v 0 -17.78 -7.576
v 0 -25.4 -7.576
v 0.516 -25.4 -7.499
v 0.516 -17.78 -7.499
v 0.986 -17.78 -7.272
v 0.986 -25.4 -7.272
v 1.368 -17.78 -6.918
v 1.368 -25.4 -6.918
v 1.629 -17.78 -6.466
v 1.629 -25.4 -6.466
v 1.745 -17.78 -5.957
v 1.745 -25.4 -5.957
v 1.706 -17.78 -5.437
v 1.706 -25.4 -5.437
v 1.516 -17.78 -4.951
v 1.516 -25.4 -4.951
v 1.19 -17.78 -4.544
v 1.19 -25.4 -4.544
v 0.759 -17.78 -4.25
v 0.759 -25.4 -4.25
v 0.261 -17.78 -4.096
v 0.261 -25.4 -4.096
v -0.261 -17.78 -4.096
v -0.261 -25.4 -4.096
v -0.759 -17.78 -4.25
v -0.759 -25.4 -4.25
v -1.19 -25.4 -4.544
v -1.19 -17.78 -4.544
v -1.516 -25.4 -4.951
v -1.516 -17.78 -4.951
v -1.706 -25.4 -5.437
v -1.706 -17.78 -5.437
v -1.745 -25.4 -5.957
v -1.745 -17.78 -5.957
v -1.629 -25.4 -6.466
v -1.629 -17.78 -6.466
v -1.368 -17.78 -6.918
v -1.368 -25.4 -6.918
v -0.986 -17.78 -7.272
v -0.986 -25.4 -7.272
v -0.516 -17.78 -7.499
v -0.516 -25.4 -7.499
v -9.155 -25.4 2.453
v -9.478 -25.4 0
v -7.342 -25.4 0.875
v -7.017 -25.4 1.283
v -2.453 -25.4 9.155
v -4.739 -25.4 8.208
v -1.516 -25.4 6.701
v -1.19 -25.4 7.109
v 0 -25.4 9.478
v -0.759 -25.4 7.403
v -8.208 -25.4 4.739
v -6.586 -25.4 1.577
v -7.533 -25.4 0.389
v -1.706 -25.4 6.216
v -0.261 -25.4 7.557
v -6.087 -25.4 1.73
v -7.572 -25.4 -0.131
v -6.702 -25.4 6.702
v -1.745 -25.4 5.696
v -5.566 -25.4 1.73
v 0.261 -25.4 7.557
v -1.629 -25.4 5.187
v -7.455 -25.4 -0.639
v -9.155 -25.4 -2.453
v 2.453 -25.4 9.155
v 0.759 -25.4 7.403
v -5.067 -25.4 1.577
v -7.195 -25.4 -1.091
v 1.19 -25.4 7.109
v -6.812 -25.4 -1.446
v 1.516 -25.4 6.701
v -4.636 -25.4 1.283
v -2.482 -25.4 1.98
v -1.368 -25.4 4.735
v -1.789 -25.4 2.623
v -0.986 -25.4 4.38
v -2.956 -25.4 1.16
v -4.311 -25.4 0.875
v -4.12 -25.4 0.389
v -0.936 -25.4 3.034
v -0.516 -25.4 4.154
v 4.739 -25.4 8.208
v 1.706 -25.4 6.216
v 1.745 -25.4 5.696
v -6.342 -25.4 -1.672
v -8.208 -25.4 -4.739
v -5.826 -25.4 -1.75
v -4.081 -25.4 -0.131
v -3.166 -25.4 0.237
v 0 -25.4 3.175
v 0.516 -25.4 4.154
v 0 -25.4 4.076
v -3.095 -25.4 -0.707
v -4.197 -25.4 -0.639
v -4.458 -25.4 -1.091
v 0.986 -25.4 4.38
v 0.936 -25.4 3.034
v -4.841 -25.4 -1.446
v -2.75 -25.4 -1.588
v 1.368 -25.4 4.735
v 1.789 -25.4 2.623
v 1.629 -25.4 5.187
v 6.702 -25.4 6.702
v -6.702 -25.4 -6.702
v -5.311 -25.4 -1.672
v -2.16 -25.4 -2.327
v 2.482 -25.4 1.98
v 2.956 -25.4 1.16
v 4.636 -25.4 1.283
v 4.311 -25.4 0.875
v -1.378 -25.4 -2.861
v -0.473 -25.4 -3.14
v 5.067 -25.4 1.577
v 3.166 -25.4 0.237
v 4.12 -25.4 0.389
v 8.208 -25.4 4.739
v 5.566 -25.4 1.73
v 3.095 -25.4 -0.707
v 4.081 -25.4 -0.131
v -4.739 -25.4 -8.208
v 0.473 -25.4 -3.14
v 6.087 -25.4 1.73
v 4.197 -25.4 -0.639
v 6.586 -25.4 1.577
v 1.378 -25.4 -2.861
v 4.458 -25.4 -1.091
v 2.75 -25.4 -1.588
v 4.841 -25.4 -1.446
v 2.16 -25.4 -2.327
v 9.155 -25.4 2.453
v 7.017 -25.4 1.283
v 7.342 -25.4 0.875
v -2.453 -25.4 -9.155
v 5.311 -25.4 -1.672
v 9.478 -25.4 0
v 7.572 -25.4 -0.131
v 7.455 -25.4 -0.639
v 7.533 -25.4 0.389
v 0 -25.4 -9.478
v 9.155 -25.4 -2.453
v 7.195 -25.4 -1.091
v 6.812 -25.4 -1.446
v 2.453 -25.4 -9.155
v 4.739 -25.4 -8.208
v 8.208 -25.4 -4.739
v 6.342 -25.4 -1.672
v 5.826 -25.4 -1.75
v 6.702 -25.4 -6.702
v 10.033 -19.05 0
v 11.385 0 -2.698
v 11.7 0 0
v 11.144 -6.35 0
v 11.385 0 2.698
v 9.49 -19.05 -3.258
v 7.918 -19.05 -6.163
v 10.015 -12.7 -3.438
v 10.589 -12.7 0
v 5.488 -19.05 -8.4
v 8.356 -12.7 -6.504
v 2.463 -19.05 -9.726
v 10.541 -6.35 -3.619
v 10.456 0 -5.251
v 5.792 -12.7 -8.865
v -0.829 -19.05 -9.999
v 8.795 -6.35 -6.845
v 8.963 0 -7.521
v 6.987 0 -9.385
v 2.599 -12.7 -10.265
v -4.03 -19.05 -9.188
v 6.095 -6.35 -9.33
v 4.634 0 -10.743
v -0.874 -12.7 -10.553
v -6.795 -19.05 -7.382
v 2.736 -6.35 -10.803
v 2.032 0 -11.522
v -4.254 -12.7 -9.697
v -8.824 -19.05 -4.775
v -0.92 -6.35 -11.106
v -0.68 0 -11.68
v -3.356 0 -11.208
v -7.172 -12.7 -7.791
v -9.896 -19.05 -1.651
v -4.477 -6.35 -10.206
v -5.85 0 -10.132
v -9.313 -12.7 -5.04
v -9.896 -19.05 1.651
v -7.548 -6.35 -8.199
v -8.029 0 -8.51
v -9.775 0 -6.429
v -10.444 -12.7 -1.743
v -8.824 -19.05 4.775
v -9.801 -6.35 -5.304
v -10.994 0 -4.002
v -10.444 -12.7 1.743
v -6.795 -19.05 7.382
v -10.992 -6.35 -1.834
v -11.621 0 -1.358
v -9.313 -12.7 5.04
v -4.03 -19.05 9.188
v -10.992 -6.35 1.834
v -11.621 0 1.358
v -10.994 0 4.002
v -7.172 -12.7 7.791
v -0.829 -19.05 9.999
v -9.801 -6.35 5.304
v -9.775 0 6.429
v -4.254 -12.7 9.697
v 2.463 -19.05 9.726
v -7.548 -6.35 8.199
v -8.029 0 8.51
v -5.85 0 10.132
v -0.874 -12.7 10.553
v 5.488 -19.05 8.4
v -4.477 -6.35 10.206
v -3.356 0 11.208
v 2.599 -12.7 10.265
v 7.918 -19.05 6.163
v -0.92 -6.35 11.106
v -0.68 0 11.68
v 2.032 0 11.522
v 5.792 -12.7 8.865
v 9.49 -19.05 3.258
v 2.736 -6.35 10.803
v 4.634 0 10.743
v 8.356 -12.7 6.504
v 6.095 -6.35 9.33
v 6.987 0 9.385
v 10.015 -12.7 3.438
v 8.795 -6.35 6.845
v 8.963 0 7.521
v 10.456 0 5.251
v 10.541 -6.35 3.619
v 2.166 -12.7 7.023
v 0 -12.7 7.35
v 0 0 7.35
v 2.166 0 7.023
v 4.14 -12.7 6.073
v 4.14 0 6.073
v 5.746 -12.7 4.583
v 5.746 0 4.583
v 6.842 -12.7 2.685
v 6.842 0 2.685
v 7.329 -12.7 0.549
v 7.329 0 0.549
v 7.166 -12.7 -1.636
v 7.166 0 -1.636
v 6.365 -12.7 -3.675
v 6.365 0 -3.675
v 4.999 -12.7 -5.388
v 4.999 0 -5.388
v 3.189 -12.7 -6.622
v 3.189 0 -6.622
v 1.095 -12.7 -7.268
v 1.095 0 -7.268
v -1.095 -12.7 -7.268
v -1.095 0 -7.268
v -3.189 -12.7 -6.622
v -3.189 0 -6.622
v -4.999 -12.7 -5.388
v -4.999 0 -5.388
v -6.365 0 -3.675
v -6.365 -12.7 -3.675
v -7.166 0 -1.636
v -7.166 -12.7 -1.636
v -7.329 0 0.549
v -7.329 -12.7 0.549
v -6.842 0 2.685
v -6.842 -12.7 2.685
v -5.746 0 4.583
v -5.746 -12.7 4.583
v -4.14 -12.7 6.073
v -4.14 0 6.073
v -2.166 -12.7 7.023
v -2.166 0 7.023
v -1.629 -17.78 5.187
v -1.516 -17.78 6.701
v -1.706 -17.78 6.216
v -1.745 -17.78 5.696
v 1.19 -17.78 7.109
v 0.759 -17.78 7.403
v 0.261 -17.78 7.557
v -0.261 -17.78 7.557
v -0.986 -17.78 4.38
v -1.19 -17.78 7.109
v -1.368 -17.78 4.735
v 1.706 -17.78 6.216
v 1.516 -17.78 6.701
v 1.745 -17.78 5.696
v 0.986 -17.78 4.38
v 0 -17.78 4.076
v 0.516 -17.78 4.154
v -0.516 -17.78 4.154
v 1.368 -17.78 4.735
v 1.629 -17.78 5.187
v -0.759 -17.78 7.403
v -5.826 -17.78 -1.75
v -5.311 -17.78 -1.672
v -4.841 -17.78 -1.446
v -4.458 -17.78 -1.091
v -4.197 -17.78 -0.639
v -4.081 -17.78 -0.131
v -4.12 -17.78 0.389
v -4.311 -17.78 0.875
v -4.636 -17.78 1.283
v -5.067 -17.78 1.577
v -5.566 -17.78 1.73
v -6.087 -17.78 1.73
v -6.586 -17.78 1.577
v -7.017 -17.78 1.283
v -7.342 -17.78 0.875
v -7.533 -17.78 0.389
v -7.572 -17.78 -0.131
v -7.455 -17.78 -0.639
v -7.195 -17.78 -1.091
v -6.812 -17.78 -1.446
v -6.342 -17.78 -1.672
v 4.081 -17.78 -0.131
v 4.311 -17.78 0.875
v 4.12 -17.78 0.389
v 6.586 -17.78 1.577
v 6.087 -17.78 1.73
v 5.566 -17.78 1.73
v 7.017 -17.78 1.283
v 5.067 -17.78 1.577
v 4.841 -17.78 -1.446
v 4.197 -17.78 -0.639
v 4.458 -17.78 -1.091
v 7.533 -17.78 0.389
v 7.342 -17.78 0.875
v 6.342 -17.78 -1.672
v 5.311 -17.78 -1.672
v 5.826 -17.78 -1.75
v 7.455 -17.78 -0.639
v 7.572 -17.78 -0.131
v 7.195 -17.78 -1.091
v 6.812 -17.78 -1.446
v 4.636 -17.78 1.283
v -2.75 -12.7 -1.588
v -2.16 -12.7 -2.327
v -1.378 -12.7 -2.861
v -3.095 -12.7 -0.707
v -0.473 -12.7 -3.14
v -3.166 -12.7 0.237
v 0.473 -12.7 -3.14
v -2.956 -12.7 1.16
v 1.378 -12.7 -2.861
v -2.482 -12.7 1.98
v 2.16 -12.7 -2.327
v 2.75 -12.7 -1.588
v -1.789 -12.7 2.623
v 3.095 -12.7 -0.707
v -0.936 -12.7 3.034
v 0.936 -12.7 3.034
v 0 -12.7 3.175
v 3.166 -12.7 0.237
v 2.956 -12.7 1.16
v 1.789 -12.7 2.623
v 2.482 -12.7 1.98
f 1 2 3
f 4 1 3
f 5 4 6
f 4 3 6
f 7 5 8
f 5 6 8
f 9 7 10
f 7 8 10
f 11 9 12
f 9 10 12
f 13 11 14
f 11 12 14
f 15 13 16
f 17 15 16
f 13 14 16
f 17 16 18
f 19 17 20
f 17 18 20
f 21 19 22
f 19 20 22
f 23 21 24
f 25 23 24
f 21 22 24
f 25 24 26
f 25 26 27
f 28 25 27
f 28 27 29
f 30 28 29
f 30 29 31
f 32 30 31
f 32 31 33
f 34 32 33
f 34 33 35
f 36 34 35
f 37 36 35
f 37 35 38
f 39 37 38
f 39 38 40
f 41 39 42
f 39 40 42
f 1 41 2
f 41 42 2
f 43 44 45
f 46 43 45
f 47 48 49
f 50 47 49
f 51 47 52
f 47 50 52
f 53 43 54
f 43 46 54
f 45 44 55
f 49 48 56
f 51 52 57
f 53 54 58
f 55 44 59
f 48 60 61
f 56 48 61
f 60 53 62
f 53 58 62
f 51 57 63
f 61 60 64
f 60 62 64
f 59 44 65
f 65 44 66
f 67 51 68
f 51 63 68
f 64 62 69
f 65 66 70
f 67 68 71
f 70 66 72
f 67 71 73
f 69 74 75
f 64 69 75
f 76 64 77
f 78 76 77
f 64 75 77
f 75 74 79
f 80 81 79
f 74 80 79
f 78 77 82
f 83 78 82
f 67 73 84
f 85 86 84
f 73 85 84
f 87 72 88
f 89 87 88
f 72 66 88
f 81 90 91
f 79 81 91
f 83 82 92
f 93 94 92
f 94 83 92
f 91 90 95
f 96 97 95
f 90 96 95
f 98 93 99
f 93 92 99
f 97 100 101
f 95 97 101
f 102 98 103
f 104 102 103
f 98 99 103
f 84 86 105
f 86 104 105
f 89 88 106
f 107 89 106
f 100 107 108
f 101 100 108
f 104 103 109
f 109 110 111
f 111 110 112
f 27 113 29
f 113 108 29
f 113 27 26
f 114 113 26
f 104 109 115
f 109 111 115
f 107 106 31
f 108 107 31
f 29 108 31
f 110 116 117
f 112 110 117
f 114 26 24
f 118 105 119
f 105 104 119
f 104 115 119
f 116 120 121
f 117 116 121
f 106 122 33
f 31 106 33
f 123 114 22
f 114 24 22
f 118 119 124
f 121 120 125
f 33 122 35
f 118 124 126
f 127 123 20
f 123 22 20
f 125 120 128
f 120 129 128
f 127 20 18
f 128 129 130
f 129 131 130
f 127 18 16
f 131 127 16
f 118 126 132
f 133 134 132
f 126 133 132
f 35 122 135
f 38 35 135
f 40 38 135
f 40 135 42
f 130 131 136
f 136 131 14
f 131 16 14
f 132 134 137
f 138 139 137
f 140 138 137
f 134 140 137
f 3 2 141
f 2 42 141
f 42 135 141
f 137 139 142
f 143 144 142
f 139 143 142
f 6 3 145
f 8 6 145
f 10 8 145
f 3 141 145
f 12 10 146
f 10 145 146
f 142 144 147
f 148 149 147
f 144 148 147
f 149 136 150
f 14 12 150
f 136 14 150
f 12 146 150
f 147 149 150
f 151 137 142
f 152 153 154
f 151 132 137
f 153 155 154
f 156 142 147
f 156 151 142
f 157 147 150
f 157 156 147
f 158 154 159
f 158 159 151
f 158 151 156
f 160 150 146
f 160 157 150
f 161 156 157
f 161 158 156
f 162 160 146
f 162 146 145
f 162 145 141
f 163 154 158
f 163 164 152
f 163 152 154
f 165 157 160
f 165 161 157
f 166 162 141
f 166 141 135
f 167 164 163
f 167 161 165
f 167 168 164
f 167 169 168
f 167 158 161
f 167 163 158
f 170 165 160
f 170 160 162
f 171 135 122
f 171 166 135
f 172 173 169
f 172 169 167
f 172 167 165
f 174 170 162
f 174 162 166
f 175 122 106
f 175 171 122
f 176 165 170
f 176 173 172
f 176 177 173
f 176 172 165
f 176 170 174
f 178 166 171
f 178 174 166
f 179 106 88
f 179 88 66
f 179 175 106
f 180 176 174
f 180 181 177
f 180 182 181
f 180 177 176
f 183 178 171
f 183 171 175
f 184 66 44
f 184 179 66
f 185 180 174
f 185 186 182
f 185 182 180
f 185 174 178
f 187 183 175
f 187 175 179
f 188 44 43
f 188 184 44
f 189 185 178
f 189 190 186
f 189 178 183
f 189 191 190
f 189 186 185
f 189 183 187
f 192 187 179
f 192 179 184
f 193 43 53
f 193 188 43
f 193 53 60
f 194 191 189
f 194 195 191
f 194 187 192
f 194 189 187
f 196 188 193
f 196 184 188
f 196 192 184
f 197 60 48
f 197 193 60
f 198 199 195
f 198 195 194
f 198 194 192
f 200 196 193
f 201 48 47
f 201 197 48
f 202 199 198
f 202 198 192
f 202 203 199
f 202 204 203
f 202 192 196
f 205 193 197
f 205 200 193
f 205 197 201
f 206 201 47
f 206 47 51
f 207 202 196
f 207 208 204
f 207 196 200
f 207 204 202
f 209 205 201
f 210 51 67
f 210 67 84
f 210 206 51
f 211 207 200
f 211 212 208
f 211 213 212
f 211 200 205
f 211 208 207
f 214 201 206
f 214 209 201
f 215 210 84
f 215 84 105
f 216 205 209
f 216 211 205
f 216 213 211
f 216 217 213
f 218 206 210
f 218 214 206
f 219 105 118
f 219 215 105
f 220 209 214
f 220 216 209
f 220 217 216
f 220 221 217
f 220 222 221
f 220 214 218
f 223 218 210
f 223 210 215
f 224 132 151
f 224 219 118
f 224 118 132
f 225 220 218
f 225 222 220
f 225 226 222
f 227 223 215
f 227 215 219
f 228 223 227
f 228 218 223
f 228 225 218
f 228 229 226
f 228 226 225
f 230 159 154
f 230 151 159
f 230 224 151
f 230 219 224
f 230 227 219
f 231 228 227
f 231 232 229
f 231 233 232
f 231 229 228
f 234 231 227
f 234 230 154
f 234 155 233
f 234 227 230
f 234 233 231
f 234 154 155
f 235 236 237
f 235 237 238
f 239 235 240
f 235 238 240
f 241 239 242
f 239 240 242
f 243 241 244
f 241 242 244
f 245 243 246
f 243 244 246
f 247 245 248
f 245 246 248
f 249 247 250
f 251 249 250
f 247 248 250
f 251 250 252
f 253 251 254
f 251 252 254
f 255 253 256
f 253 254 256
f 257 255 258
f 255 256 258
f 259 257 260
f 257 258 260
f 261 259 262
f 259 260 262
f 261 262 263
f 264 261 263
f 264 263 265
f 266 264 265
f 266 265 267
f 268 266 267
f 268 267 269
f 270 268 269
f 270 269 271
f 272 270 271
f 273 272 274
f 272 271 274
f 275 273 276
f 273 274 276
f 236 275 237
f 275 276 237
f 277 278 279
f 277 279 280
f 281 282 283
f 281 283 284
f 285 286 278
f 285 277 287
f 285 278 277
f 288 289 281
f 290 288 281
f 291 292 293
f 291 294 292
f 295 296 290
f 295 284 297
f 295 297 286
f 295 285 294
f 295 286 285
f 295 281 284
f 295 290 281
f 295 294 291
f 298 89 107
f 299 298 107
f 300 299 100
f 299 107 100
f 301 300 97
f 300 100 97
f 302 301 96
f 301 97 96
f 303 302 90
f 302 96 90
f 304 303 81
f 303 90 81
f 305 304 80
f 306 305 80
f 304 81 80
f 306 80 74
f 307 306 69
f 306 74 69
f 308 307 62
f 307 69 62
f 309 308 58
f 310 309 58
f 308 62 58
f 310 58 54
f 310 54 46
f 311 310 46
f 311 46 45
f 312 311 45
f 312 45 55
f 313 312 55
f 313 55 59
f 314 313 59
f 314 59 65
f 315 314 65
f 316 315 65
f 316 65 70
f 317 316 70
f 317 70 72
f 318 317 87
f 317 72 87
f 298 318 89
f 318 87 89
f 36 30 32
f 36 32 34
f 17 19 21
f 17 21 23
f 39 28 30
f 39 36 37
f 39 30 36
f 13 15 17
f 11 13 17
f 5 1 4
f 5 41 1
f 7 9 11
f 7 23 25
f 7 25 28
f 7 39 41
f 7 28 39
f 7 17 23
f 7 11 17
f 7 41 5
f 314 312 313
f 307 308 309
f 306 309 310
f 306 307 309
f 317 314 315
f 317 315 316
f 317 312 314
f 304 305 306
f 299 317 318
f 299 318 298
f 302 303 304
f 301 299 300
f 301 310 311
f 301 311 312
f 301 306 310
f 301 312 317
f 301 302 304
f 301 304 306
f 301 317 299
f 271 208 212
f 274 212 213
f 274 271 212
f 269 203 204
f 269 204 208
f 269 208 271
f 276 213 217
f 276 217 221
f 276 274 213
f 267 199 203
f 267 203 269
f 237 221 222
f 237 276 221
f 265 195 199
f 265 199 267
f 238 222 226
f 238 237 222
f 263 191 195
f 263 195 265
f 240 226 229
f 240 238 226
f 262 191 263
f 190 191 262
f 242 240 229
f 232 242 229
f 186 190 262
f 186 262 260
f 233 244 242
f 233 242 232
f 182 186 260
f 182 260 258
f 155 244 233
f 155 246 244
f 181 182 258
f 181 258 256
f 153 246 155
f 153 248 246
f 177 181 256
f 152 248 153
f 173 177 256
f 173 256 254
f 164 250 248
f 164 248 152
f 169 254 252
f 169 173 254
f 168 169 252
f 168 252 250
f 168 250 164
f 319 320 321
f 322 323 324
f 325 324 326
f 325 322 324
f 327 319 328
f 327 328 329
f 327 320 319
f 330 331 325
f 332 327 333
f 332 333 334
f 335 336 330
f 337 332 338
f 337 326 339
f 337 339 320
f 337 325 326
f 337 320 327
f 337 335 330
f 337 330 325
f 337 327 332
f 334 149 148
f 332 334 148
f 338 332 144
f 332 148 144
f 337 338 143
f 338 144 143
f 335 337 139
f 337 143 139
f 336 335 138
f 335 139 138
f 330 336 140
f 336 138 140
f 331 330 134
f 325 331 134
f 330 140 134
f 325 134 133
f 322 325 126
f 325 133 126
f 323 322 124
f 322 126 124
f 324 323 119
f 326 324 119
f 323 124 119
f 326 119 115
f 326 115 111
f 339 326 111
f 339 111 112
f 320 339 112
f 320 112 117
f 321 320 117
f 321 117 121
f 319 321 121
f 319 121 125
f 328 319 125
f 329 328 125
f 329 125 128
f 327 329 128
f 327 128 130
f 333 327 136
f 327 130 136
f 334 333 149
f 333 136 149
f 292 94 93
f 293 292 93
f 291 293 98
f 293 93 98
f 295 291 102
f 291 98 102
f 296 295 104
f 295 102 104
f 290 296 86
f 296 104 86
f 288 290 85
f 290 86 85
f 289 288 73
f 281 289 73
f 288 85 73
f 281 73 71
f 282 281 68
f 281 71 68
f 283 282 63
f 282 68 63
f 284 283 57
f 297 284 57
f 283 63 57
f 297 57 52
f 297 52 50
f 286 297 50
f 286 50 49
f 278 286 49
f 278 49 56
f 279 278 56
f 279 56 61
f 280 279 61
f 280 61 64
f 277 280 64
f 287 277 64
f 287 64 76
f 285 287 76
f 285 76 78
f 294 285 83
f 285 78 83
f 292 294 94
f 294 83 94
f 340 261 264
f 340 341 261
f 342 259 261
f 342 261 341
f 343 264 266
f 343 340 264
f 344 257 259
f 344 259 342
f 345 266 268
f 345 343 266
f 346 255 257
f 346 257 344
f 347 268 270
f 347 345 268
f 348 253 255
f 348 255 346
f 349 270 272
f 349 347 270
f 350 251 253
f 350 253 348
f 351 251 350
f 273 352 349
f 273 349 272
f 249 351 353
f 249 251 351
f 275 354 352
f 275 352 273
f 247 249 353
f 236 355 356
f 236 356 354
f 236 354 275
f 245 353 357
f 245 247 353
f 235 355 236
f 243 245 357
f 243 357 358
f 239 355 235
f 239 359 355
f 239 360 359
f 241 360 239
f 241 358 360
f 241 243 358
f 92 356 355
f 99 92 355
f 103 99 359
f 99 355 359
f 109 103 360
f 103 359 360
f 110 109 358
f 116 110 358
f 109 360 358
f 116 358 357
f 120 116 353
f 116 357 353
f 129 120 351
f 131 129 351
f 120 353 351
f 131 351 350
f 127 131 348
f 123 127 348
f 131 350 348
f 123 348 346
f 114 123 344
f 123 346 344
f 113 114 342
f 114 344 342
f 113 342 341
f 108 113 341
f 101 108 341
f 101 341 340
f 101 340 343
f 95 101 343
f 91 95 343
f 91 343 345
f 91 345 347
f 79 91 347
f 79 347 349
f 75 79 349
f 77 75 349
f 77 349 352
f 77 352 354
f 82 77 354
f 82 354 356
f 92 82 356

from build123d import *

# Parameters (mm, degrees)
SKETCH1_R           = 11.7
BOSS_EXTRUDE1_DEPTH = 25.4
BOSS_EXTRUDE1_DRAFT = -5
SKETCH2_R           = 3.175
CUT_EXTRUDE1_DEPTH  = 31.314023158
SKETCH9_R           = 7.35
CUT_EXTRUDE3_DEPTH  = 12.7
SKETCH14_R          = 1.75
CUT_EXTRUDE5_DEPTH  = 7.62


with BuildPart() as part:
    # Sketch1 → Boss-Extrude1 (with draft: the straight prism first)
    with BuildSketch(Plane(origin=(0, 0, 0), x_dir=(1, 0, 0), z_dir=(0, 1, 0))):
        Circle(SKETCH1_R)
    extrude(amount=-BOSS_EXTRUDE1_DEPTH)
    # Boss-Extrude1: the draft: its side faces are tilted about the plane it starts from
    boss_extrude1_sides = [part.faces().sort_by_distance(p)[0] for p in [
        (-11.7, -12.7, 0),
    ]]
    draft(boss_extrude1_sides, Plane(origin=(0, 0, 0), x_dir=(1, 0, 0), z_dir=(0, 1, 0)), BOSS_EXTRUDE1_DRAFT)

    # Sketch2 → Cut-Extrude1 (cut, through all)
    with BuildSketch(Plane(origin=(0, 0, 0), x_dir=(1, 0, 0), z_dir=(0, 1, 0))):
        with Locations(Location((0, 0, 0), (0, 0, 270))):
            Circle(SKETCH2_R)
    extrude(amount=-CUT_EXTRUDE1_DEPTH, mode=Mode.SUBTRACT)

    # Sketch9 → Cut-Extrude3 (cut)
    with BuildSketch(Plane(origin=(0, 0, 0), x_dir=(1, 0, 0), z_dir=(0, 1, 0))):
        with Locations(Location((0, 0, 0), (0, 0, 270))):
            Circle(SKETCH9_R)
    extrude(amount=-CUT_EXTRUDE3_DEPTH, mode=Mode.SUBTRACT)

    # Sketch14 → Cut-Extrude5 (cut)
    with BuildSketch(Plane.XZ.offset(25.4)):
        with Locations(Location((-5.826393973, 0, 0), (0, 0, 270))):
            Circle(SKETCH14_R)
        with Locations(Location((0, 5.826393973, 0), (0, 0, 270))):
            Circle(SKETCH14_R)
        with Locations(Location((5.826393973, 0, 0), (0, 0, 270))):
            Circle(SKETCH14_R)
        with Locations(Location((0, -5.826393973, 0), (0, 0, 270))):
            Circle(SKETCH14_R)
    extrude(amount=-CUT_EXTRUDE5_DEPTH, mode=Mode.SUBTRACT)


solid = part.part
